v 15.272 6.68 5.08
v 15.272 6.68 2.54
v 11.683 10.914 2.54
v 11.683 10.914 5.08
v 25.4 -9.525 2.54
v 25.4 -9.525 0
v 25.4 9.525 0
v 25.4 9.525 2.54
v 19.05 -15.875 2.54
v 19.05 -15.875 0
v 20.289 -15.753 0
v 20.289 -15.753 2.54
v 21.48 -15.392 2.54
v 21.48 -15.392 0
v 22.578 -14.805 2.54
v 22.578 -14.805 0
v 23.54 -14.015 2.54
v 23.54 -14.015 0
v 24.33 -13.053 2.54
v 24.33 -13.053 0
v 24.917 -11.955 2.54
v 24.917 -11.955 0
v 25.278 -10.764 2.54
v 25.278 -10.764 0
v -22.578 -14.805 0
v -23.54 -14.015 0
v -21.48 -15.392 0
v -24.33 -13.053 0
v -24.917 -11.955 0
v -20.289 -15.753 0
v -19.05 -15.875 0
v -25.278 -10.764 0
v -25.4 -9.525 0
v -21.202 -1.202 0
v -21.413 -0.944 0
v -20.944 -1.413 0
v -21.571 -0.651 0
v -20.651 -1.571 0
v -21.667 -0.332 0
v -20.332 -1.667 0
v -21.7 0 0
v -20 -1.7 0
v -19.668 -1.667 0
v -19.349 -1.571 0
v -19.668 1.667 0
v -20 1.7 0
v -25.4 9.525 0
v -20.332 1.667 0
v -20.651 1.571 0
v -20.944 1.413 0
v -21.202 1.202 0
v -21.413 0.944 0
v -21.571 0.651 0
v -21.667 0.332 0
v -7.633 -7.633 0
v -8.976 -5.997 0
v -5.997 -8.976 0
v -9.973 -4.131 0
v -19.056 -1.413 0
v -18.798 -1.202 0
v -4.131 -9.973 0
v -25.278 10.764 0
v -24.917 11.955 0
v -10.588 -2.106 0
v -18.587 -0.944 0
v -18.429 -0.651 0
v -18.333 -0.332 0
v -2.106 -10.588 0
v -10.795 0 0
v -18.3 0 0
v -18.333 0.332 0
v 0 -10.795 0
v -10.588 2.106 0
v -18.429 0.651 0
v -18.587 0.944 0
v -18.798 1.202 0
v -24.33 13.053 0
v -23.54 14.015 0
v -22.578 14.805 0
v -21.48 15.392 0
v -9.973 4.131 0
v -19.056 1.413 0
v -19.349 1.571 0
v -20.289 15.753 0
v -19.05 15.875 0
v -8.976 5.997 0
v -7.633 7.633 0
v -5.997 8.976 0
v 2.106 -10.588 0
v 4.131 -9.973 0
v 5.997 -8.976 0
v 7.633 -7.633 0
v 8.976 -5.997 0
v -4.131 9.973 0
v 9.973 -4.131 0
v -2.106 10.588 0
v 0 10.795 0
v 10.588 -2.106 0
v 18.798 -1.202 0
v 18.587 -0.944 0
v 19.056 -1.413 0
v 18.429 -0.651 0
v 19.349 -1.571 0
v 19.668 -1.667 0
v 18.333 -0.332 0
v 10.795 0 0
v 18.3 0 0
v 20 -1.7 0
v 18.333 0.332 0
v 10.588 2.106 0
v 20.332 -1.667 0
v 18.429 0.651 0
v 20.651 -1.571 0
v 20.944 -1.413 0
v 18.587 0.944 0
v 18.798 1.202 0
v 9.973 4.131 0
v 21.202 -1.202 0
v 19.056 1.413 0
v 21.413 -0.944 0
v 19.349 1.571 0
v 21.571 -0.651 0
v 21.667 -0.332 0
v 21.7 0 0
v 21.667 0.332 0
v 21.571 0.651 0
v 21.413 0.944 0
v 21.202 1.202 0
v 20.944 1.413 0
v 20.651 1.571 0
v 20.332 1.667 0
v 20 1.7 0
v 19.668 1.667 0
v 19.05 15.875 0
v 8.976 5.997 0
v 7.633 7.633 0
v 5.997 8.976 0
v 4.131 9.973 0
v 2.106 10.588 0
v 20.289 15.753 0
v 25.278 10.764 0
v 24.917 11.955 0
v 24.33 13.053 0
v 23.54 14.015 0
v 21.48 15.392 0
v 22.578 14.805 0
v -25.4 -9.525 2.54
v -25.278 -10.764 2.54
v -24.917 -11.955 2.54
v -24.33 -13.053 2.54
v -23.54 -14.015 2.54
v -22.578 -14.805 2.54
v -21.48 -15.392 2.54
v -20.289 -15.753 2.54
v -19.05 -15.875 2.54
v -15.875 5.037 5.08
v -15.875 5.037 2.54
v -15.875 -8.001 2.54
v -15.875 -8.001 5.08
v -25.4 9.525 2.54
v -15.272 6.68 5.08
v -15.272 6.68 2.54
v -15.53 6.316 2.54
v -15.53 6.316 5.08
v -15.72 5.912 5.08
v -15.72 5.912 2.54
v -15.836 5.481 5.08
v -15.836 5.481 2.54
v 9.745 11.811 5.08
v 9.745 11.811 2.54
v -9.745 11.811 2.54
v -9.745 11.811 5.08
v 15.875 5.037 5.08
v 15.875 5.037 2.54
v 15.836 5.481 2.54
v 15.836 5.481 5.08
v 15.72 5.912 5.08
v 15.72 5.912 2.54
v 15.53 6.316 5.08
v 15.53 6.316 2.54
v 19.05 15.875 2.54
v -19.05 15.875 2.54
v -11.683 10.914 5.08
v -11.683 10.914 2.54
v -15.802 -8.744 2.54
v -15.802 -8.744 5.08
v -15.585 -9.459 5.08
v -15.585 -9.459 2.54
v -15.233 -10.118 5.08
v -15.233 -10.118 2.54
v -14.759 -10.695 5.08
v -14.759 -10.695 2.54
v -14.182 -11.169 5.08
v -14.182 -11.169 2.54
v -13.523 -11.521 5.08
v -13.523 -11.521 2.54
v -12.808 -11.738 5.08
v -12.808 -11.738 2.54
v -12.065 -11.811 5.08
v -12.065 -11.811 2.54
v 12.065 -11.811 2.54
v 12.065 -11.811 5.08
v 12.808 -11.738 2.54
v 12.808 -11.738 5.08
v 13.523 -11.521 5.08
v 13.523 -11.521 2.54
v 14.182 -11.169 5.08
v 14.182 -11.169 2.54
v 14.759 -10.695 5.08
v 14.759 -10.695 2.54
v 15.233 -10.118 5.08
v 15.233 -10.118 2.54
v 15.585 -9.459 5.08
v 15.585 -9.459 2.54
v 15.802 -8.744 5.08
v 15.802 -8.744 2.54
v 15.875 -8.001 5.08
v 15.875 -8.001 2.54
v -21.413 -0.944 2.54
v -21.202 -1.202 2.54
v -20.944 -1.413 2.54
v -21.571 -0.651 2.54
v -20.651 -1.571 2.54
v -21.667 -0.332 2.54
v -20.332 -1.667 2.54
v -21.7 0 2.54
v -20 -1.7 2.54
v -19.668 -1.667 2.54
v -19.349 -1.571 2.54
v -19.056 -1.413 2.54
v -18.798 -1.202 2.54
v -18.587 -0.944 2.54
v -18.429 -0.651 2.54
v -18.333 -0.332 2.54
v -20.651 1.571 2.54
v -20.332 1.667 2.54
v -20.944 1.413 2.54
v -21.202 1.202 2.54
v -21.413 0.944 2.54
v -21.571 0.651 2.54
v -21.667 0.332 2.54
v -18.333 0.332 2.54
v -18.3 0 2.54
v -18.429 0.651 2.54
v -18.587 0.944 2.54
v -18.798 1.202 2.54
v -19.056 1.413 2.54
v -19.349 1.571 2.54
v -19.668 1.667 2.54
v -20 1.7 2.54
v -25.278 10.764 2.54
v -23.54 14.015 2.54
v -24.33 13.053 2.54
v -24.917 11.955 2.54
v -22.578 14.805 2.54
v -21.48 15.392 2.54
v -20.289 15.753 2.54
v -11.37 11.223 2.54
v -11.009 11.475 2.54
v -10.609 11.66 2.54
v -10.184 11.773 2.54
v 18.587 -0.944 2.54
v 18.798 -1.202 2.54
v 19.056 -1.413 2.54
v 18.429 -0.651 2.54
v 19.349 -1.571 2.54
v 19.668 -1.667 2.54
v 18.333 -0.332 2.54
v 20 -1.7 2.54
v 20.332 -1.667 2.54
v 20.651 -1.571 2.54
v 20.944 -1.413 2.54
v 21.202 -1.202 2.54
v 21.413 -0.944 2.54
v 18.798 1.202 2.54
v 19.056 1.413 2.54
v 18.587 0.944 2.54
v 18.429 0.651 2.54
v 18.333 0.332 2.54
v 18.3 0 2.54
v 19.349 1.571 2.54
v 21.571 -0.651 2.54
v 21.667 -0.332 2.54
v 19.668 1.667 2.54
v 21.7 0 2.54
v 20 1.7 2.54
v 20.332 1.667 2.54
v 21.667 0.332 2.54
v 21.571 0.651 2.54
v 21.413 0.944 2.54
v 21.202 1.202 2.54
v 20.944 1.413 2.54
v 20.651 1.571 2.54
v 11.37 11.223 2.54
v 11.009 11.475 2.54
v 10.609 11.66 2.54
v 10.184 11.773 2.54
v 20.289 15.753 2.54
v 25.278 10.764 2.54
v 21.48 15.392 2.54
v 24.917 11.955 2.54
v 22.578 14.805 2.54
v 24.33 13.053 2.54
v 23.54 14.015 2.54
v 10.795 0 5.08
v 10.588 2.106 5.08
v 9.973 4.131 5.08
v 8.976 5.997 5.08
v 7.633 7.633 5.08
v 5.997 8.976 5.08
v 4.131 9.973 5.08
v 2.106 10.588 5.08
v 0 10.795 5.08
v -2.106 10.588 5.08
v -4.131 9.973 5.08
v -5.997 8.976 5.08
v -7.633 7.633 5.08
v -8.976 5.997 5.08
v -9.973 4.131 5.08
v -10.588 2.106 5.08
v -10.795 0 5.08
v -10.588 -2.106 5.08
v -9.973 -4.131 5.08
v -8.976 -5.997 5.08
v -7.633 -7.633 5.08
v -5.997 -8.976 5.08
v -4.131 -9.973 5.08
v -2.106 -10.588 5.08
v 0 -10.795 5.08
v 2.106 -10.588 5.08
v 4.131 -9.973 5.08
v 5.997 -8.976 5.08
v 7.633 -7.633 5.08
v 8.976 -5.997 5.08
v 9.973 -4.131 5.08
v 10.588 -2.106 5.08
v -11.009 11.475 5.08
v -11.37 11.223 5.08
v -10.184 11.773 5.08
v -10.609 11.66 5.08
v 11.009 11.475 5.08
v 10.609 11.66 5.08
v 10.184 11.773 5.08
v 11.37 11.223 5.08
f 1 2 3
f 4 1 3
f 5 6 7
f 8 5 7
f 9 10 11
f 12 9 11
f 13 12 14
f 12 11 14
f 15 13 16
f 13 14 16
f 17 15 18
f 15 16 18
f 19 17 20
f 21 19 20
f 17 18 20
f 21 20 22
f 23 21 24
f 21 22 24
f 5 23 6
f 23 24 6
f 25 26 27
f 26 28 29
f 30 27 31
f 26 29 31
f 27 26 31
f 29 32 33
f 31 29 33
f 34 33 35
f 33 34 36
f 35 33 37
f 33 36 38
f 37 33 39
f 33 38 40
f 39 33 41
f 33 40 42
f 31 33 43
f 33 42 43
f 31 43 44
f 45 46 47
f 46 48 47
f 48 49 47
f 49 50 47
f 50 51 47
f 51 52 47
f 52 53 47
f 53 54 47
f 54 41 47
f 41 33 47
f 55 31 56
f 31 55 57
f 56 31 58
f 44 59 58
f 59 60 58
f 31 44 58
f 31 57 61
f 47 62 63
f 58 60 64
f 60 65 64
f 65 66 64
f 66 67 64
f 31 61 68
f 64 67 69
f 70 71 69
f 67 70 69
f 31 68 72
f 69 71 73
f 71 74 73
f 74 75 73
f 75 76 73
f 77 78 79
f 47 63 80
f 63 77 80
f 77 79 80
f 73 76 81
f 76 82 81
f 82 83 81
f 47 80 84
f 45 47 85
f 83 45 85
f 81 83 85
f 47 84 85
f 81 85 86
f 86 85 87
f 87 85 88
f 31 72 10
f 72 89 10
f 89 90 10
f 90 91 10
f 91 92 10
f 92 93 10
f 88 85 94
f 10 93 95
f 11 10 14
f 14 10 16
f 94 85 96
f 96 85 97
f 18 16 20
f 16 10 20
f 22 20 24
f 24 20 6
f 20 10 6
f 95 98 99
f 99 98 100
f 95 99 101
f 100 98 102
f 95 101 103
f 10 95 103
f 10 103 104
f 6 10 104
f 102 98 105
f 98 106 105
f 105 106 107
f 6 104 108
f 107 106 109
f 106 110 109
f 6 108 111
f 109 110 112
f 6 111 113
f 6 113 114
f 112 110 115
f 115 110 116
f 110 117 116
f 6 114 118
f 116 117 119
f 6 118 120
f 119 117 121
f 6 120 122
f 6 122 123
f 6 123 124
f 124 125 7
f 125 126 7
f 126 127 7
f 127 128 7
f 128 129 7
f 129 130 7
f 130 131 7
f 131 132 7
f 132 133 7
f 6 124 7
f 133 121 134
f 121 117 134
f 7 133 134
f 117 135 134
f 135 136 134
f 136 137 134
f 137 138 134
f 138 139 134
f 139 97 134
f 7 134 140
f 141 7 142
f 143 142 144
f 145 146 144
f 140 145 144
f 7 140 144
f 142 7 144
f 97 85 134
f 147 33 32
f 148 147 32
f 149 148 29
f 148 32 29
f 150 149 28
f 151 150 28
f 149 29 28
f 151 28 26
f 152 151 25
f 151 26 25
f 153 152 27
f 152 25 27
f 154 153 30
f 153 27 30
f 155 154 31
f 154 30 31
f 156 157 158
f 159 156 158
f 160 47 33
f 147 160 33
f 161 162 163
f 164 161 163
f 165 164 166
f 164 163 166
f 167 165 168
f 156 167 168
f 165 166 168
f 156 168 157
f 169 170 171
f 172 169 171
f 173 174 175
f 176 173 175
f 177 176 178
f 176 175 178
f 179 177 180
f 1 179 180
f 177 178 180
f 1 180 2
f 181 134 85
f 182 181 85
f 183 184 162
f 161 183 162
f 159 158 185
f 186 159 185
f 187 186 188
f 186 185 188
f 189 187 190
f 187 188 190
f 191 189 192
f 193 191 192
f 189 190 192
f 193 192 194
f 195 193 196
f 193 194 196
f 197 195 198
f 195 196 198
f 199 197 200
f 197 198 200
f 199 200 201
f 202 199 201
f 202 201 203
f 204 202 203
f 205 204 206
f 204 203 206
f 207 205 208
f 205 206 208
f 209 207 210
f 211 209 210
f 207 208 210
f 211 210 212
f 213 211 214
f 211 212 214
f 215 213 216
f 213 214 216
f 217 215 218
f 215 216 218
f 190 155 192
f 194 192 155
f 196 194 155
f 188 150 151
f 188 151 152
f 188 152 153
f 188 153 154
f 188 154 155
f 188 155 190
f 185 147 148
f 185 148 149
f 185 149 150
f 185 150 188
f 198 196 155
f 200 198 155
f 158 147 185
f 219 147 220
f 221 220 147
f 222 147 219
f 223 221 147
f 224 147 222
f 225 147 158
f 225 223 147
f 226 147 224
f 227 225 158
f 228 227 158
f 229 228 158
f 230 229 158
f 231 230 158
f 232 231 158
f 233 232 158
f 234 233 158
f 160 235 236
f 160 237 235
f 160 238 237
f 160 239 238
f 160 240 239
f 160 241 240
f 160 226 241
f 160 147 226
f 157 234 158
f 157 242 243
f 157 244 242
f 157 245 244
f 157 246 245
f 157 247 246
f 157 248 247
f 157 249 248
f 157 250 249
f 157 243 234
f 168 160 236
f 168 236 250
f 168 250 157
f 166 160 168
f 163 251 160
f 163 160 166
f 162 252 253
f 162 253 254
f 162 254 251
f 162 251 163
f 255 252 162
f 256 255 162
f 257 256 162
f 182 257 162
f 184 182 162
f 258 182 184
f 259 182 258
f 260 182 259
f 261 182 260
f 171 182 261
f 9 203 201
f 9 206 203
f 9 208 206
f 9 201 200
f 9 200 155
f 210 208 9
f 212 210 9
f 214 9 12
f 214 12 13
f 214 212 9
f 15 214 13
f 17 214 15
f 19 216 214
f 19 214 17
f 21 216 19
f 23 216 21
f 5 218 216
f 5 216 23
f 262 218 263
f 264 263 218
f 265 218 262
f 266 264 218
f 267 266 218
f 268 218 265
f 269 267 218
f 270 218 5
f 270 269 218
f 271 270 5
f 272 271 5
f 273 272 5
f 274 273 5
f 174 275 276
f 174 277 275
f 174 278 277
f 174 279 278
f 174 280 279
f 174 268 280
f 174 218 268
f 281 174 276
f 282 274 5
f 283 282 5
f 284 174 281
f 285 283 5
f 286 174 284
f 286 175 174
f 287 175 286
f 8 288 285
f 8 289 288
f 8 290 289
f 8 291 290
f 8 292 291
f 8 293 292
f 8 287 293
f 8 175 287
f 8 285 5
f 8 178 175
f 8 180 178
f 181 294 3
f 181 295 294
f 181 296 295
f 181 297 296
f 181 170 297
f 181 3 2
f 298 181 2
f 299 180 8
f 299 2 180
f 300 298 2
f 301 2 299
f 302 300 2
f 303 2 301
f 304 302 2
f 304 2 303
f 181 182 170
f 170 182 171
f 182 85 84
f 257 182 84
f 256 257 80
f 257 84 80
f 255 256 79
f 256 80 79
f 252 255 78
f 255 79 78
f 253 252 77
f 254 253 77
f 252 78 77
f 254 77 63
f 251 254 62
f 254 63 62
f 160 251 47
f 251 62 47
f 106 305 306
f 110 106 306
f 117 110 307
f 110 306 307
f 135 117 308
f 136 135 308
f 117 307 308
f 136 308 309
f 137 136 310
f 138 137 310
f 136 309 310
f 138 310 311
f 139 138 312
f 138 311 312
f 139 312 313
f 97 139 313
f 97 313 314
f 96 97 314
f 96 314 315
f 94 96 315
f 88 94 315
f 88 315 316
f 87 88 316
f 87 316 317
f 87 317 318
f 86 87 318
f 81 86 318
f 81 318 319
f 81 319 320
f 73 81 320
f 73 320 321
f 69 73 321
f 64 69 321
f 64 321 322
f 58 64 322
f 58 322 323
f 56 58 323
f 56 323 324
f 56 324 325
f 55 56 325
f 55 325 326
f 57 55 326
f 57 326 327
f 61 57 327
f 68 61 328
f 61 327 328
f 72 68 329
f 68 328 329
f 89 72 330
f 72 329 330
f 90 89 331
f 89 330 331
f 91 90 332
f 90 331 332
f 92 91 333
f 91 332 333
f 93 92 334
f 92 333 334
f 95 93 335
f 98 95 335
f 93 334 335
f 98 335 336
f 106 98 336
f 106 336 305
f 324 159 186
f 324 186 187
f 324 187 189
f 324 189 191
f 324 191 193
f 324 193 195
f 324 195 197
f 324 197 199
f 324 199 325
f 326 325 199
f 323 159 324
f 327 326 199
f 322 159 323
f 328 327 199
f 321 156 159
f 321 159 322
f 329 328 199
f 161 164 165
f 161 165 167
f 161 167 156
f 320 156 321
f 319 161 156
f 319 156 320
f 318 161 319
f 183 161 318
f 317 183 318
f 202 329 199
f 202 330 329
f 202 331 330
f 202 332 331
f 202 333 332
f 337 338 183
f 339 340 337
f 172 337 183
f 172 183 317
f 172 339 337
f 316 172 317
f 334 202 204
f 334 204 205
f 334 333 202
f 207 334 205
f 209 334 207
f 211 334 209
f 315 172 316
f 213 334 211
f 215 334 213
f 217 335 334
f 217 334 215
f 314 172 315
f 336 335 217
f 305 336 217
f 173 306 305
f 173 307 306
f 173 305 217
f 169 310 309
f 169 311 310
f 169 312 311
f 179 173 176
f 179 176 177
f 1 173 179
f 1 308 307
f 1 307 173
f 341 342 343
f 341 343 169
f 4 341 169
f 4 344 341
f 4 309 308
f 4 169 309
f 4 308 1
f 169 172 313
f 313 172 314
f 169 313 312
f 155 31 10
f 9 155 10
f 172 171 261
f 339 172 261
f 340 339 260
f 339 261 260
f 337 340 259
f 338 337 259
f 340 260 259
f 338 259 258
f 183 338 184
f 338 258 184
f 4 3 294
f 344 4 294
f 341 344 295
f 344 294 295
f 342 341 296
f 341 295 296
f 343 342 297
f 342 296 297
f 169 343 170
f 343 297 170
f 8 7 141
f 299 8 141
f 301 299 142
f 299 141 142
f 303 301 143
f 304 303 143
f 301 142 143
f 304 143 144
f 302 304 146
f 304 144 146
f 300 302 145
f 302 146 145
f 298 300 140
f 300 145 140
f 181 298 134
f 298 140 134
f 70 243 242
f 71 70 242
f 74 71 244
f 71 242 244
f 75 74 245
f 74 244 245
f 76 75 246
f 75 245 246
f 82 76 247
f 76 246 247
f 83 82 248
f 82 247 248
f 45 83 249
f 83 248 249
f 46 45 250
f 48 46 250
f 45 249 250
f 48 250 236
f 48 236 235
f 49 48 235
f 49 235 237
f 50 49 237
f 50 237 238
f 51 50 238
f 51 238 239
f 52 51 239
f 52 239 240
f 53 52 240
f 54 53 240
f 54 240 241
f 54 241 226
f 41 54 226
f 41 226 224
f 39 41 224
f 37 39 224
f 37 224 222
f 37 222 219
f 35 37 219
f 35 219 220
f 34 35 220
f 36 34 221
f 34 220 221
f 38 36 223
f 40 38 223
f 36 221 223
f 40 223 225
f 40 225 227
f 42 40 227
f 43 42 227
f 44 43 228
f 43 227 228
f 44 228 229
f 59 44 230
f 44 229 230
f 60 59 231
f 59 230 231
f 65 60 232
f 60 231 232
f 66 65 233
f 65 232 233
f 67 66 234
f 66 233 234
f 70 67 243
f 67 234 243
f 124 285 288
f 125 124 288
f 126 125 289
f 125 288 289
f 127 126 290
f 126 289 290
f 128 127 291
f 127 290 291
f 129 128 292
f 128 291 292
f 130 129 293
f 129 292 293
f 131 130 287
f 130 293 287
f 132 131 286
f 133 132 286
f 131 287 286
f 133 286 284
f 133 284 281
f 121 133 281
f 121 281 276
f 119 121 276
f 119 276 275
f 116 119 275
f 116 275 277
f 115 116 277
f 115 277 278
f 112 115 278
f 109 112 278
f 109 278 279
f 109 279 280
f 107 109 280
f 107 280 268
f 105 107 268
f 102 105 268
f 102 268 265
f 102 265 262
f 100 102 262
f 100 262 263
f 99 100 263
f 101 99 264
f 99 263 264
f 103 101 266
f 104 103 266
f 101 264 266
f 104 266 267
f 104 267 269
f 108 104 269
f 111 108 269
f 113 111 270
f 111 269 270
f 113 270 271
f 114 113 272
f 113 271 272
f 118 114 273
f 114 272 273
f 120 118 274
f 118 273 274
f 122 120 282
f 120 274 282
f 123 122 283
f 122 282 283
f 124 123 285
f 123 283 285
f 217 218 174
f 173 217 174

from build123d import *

# Parameters (mm, degrees)
F1_DEPTH = 2.54
F3_DEPTH = 2.54
F4_R     = 10.795
F4_R_2   = 1.7
F5_DEPTH = 5.081


with BuildPart() as f1:
    # F0 (on Top) → F1 (new body)
    with BuildSketch(Plane.XY):
        with BuildLine():
            Line((-19.05, -15.875), (19.05, -15.875))
            ThreePointArc((19.05, -15.875), (23.540128, -14.015128), (25.4, -9.525))
            Line((25.4, -9.525), (25.4, 9.525))
            ThreePointArc((25.4, 9.525), (23.540128, 14.015128), (19.05, 15.875))
            Line((19.05, 15.875), (-19.05, 15.875))
            ThreePointArc((-19.05, 15.875), (-23.540128, 14.015128), (-25.4, 9.525))
            Line((-25.4, 9.525), (-25.4, -9.525))
            ThreePointArc((-25.4, -9.525), (-23.540128, -14.015128), (-19.05, -15.875))
        make_face()
    extrude(amount=F1_DEPTH)

    # F2 (on face) → F3 (join)
    with BuildSketch(Plane.XY.offset(2.54)):
        with BuildLine():
            Line((-12.065, -11.811), (12.065, -11.811))
            ThreePointArc((12.065, -11.811), (14.759077, -10.695077), (15.875, -8.001))
            Line((15.875, -8.001), (15.875, 5.037175))
            ThreePointArc((15.875, 5.037175), (15.719597, 5.911989), (15.272403, 6.679756))
            Line((15.272403, 6.679756), (11.682856, 10.913581))
            ThreePointArc((11.682856, 10.913581), (10.813031, 11.575751), (9.745453, 11.811))
            Line((9.745453, 11.811), (-9.745453, 11.811))
            ThreePointArc((-9.745453, 11.811), (-10.813031, 11.575751), (-11.682856, 10.913581))
            Line((-11.682856, 10.913581), (-15.272403, 6.679756))
            ThreePointArc((-15.272403, 6.679756), (-15.719597, 5.911989), (-15.875, 5.037175))
            Line((-15.875, 5.037175), (-15.875, -8.001))
            ThreePointArc((-15.875, -8.001), (-14.759077, -10.695077), (-12.065, -11.811))
        make_face()
    extrude(amount=F3_DEPTH)

    # F4 (on face) → F5 (cut, through all)
    with BuildSketch(Plane.XY.offset(5.08)):
        Circle(F4_R)
        with Locations((-20, 0)):
            Circle(F4_R_2)
        with Locations((20, 0)):
            Circle(F4_R_2)
    extrude(amount=-F5_DEPTH, mode=Mode.SUBTRACT)


solid = f1.part
